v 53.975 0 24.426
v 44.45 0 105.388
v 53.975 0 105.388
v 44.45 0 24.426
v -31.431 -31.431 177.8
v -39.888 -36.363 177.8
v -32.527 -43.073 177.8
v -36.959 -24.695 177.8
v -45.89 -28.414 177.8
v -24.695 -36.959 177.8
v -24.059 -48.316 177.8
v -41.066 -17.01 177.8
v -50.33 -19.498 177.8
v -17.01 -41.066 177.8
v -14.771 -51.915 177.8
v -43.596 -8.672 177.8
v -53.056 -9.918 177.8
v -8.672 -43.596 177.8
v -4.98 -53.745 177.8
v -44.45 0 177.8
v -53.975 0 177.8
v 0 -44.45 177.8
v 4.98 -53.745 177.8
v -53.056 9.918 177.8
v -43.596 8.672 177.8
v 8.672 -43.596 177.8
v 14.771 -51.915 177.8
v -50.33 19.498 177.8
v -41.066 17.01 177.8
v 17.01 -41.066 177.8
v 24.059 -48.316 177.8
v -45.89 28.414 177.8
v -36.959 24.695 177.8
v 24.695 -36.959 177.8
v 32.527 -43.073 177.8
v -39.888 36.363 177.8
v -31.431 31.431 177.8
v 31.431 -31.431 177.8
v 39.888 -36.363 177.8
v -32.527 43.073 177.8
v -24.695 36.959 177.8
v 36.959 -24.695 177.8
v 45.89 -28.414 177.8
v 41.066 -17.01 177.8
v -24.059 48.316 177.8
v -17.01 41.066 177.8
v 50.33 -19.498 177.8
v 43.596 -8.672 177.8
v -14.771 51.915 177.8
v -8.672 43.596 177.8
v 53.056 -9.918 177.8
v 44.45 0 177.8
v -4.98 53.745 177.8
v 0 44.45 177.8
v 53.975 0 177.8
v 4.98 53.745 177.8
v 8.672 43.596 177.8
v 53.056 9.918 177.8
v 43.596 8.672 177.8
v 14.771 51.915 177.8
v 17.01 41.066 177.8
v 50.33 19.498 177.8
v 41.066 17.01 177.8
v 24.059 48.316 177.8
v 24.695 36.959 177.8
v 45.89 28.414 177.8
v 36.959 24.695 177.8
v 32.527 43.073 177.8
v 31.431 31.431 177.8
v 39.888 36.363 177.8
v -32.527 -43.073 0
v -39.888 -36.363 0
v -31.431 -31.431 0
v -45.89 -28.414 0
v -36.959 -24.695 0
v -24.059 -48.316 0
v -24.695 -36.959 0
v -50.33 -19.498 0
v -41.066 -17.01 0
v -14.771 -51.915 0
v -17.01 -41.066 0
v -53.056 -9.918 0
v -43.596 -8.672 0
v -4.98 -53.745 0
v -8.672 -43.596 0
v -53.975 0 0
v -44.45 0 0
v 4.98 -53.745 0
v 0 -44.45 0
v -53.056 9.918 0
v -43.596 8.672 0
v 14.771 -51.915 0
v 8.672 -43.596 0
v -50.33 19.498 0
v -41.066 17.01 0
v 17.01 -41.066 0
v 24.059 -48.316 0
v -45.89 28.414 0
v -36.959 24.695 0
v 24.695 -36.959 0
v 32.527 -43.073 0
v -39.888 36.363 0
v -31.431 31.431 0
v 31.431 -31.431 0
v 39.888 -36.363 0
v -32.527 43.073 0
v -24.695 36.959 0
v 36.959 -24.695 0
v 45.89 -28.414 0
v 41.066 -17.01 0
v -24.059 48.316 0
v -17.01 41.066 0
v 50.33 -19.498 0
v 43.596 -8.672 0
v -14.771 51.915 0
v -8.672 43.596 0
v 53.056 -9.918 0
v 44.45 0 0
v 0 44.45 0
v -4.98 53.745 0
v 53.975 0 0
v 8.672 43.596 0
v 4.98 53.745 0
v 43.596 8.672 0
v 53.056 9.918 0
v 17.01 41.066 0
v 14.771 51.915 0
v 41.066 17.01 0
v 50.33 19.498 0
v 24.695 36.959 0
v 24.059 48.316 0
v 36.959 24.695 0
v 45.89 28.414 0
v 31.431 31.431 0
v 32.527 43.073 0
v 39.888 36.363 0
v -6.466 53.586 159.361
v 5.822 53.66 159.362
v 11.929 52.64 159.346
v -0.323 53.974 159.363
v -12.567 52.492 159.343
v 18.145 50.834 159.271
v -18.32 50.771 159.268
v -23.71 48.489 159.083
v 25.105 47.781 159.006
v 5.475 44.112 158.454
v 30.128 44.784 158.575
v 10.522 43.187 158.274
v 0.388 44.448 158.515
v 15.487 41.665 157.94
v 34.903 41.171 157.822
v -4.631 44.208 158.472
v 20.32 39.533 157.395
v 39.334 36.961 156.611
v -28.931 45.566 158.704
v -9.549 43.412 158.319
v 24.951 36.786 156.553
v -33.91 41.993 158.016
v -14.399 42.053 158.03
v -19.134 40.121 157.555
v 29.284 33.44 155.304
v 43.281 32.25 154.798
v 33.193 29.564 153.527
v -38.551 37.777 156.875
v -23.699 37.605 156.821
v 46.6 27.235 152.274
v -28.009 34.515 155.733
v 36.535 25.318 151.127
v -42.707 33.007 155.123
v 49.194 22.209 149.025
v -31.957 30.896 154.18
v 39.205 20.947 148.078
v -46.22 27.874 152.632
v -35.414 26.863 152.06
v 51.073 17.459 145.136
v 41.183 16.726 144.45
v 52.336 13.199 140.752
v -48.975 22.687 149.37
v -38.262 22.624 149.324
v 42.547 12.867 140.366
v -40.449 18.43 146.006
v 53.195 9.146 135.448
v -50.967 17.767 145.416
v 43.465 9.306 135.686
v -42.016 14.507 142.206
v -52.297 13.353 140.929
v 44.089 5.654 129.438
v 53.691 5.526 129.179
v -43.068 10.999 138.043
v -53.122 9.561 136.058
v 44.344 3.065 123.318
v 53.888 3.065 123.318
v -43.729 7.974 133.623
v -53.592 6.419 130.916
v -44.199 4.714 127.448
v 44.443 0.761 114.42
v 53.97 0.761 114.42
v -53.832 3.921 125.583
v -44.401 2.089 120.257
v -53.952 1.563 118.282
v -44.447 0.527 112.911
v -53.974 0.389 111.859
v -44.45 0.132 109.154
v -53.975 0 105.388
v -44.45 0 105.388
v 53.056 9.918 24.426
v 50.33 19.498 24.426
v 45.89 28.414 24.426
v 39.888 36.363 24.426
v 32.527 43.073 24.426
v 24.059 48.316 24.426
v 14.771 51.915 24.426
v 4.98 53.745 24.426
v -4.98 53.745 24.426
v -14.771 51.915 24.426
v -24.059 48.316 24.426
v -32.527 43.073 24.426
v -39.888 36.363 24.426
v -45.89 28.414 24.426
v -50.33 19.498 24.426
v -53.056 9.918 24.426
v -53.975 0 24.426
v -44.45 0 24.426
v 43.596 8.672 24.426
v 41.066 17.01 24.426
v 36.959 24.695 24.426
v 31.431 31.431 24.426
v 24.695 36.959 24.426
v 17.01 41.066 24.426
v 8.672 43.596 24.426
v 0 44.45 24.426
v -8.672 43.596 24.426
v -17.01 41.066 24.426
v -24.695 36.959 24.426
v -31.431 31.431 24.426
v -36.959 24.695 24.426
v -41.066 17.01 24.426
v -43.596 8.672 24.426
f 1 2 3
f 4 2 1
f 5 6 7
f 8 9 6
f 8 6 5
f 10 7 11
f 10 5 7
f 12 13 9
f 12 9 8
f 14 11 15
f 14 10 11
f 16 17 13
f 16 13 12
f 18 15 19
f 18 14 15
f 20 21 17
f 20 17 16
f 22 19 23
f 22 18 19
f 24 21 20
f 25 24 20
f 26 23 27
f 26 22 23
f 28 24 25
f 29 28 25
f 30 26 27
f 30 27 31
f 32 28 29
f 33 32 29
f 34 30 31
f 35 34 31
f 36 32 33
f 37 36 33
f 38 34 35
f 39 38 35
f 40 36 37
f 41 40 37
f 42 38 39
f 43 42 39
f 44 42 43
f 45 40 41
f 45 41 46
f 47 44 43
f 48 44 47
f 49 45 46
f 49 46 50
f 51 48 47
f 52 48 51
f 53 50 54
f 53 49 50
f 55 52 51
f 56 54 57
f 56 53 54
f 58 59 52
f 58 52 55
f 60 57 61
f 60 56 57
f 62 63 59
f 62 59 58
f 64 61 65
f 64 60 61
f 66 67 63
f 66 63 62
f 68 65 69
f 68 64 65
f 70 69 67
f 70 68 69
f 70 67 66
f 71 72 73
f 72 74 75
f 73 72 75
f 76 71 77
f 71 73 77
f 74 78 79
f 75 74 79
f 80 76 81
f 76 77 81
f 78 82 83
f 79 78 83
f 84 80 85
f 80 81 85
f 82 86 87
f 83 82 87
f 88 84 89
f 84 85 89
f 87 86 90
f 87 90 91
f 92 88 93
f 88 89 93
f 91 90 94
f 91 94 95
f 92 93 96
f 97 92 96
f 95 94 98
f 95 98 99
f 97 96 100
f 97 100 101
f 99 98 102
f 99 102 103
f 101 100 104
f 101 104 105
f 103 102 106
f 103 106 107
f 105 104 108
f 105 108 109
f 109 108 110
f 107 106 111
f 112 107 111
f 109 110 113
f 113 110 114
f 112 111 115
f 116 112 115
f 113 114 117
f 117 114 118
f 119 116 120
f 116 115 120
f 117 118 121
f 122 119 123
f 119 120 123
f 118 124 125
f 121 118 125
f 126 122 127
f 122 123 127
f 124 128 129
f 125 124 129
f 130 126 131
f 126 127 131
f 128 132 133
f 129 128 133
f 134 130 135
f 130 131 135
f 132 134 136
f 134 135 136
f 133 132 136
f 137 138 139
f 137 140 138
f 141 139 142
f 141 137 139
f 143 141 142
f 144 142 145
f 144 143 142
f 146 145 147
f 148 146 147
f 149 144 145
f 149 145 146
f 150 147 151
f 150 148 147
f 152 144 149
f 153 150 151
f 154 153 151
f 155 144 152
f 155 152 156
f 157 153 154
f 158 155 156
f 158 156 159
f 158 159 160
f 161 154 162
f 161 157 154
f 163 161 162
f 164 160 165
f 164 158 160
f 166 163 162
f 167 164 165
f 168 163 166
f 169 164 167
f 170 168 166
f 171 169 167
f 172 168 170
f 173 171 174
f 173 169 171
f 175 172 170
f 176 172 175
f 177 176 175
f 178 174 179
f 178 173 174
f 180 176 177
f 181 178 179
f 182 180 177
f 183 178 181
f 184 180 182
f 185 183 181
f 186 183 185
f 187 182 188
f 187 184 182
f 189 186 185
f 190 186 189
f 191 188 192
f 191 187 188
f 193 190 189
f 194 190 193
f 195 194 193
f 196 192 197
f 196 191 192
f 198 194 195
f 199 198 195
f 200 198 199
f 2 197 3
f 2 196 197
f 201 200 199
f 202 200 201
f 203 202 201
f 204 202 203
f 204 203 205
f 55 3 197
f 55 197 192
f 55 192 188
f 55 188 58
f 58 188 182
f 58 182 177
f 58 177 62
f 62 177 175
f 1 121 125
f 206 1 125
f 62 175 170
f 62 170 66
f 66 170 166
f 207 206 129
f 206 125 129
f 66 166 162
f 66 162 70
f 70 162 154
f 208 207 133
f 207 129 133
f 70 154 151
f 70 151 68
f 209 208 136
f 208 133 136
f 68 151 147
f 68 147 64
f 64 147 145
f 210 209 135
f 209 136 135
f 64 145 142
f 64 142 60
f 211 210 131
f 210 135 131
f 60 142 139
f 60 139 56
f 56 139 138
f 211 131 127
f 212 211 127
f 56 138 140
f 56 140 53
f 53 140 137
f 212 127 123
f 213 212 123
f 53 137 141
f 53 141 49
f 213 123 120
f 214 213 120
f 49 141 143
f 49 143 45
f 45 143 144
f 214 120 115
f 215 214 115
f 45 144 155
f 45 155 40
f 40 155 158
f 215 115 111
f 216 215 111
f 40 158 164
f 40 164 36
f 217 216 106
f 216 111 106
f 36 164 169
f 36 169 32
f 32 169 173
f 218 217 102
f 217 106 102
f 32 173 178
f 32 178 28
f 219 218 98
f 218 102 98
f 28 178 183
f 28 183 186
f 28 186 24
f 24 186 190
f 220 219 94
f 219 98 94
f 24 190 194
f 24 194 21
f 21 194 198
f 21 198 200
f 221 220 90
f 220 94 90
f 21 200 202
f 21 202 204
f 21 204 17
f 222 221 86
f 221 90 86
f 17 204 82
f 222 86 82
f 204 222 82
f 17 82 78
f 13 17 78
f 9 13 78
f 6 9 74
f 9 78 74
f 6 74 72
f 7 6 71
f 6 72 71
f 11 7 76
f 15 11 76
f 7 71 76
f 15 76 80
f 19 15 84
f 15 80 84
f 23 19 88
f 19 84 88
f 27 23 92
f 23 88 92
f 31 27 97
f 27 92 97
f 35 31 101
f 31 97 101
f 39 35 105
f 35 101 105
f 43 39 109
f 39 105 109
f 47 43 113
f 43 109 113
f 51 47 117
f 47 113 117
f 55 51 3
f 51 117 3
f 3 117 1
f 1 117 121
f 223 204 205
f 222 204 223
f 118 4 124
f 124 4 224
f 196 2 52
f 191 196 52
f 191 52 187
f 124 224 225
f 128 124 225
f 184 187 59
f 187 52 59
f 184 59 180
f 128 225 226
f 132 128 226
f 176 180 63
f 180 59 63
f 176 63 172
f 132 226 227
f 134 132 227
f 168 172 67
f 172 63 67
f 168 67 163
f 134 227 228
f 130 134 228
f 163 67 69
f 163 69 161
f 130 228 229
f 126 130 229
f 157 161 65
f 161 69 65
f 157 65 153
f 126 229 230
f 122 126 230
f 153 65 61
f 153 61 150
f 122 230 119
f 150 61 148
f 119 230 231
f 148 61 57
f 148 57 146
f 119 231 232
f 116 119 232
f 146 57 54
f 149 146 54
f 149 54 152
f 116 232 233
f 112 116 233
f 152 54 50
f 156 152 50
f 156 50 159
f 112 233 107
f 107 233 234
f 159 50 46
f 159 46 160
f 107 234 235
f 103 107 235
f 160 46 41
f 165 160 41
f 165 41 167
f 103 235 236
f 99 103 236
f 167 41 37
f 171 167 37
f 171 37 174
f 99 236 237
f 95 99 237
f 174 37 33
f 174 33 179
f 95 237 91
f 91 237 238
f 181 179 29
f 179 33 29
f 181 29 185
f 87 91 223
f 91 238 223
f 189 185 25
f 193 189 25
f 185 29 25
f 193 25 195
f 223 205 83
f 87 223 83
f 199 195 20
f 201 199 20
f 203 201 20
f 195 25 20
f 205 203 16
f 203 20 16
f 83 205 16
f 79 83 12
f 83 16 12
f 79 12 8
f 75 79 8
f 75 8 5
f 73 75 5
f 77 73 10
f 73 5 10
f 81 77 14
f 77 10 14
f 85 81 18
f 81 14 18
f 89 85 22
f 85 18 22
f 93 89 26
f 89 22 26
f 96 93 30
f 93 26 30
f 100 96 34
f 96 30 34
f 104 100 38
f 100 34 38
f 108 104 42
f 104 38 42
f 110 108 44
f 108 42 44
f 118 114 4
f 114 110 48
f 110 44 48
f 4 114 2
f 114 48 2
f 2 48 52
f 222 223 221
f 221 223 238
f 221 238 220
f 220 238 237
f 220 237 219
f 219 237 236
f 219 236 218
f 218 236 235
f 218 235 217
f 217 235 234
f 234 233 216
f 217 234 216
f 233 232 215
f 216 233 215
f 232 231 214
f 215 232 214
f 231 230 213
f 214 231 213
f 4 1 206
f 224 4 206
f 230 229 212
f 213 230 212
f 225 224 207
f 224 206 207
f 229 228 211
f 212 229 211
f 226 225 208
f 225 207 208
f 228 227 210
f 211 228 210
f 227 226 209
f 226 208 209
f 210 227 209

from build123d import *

# Parameters (mm, degrees)
F0_R          = 53.975
F1_DEPTH      = 177.8
F3_DEPTH      = 78.74
F3_DEPTH_BACK = 76.2
F4_R          = 44.45
F5_DEPTH      = 259.842


with BuildPart() as f1:
    # F0 (on Top) → F1 (new body)
    with BuildSketch(Plane.XY):
        Circle(F0_R)
    extrude(amount=F1_DEPTH)

    # F2 (on Right) → F3 (cut, two sides)
    with BuildSketch(Plane.YZ) as f3_sk:
        with BuildLine():
            Line((53.975, 24.4263578206), (53.975, 51.4128883973))
            ThreePointArc((53.975, 51.4128883973), (15.8089114855, 67.2217998827), (0, 105.3878883973))
            Line((0, 105.3878883973), (0, 24.4263578206))
            Line((0, 24.4263578206), (53.975, 24.4263578206))
        make_face()
        with BuildLine():
            Line((53.975, 105.3878883973), (53.975, 159.3628883973))
            ThreePointArc((53.975, 159.3628883973), (15.8089114855, 143.5539769118), (0, 105.3878883973))
            Line((0, 105.3878883973), (53.975, 105.3878883973))
        make_face()
        with BuildLine():
            ThreePointArc((0, 105.3878883973), (15.8089114855, 67.2217998827), (53.975, 51.4128883973))
            Line((53.975, 51.4128883973), (53.975, 105.3878883973))
            Line((53.975, 105.3878883973), (0, 105.3878883973))
        make_face()
    extrude(amount=-F3_DEPTH, mode=Mode.SUBTRACT)
    extrude(f3_sk.sketch, amount=F3_DEPTH_BACK, mode=Mode.SUBTRACT)

    # F4 (on face) → F5 (cut)
    with BuildSketch(Plane.XY.offset(177.8)):
        Circle(F4_R)
    extrude(amount=-F5_DEPTH, mode=Mode.SUBTRACT)


solid = f1.part
